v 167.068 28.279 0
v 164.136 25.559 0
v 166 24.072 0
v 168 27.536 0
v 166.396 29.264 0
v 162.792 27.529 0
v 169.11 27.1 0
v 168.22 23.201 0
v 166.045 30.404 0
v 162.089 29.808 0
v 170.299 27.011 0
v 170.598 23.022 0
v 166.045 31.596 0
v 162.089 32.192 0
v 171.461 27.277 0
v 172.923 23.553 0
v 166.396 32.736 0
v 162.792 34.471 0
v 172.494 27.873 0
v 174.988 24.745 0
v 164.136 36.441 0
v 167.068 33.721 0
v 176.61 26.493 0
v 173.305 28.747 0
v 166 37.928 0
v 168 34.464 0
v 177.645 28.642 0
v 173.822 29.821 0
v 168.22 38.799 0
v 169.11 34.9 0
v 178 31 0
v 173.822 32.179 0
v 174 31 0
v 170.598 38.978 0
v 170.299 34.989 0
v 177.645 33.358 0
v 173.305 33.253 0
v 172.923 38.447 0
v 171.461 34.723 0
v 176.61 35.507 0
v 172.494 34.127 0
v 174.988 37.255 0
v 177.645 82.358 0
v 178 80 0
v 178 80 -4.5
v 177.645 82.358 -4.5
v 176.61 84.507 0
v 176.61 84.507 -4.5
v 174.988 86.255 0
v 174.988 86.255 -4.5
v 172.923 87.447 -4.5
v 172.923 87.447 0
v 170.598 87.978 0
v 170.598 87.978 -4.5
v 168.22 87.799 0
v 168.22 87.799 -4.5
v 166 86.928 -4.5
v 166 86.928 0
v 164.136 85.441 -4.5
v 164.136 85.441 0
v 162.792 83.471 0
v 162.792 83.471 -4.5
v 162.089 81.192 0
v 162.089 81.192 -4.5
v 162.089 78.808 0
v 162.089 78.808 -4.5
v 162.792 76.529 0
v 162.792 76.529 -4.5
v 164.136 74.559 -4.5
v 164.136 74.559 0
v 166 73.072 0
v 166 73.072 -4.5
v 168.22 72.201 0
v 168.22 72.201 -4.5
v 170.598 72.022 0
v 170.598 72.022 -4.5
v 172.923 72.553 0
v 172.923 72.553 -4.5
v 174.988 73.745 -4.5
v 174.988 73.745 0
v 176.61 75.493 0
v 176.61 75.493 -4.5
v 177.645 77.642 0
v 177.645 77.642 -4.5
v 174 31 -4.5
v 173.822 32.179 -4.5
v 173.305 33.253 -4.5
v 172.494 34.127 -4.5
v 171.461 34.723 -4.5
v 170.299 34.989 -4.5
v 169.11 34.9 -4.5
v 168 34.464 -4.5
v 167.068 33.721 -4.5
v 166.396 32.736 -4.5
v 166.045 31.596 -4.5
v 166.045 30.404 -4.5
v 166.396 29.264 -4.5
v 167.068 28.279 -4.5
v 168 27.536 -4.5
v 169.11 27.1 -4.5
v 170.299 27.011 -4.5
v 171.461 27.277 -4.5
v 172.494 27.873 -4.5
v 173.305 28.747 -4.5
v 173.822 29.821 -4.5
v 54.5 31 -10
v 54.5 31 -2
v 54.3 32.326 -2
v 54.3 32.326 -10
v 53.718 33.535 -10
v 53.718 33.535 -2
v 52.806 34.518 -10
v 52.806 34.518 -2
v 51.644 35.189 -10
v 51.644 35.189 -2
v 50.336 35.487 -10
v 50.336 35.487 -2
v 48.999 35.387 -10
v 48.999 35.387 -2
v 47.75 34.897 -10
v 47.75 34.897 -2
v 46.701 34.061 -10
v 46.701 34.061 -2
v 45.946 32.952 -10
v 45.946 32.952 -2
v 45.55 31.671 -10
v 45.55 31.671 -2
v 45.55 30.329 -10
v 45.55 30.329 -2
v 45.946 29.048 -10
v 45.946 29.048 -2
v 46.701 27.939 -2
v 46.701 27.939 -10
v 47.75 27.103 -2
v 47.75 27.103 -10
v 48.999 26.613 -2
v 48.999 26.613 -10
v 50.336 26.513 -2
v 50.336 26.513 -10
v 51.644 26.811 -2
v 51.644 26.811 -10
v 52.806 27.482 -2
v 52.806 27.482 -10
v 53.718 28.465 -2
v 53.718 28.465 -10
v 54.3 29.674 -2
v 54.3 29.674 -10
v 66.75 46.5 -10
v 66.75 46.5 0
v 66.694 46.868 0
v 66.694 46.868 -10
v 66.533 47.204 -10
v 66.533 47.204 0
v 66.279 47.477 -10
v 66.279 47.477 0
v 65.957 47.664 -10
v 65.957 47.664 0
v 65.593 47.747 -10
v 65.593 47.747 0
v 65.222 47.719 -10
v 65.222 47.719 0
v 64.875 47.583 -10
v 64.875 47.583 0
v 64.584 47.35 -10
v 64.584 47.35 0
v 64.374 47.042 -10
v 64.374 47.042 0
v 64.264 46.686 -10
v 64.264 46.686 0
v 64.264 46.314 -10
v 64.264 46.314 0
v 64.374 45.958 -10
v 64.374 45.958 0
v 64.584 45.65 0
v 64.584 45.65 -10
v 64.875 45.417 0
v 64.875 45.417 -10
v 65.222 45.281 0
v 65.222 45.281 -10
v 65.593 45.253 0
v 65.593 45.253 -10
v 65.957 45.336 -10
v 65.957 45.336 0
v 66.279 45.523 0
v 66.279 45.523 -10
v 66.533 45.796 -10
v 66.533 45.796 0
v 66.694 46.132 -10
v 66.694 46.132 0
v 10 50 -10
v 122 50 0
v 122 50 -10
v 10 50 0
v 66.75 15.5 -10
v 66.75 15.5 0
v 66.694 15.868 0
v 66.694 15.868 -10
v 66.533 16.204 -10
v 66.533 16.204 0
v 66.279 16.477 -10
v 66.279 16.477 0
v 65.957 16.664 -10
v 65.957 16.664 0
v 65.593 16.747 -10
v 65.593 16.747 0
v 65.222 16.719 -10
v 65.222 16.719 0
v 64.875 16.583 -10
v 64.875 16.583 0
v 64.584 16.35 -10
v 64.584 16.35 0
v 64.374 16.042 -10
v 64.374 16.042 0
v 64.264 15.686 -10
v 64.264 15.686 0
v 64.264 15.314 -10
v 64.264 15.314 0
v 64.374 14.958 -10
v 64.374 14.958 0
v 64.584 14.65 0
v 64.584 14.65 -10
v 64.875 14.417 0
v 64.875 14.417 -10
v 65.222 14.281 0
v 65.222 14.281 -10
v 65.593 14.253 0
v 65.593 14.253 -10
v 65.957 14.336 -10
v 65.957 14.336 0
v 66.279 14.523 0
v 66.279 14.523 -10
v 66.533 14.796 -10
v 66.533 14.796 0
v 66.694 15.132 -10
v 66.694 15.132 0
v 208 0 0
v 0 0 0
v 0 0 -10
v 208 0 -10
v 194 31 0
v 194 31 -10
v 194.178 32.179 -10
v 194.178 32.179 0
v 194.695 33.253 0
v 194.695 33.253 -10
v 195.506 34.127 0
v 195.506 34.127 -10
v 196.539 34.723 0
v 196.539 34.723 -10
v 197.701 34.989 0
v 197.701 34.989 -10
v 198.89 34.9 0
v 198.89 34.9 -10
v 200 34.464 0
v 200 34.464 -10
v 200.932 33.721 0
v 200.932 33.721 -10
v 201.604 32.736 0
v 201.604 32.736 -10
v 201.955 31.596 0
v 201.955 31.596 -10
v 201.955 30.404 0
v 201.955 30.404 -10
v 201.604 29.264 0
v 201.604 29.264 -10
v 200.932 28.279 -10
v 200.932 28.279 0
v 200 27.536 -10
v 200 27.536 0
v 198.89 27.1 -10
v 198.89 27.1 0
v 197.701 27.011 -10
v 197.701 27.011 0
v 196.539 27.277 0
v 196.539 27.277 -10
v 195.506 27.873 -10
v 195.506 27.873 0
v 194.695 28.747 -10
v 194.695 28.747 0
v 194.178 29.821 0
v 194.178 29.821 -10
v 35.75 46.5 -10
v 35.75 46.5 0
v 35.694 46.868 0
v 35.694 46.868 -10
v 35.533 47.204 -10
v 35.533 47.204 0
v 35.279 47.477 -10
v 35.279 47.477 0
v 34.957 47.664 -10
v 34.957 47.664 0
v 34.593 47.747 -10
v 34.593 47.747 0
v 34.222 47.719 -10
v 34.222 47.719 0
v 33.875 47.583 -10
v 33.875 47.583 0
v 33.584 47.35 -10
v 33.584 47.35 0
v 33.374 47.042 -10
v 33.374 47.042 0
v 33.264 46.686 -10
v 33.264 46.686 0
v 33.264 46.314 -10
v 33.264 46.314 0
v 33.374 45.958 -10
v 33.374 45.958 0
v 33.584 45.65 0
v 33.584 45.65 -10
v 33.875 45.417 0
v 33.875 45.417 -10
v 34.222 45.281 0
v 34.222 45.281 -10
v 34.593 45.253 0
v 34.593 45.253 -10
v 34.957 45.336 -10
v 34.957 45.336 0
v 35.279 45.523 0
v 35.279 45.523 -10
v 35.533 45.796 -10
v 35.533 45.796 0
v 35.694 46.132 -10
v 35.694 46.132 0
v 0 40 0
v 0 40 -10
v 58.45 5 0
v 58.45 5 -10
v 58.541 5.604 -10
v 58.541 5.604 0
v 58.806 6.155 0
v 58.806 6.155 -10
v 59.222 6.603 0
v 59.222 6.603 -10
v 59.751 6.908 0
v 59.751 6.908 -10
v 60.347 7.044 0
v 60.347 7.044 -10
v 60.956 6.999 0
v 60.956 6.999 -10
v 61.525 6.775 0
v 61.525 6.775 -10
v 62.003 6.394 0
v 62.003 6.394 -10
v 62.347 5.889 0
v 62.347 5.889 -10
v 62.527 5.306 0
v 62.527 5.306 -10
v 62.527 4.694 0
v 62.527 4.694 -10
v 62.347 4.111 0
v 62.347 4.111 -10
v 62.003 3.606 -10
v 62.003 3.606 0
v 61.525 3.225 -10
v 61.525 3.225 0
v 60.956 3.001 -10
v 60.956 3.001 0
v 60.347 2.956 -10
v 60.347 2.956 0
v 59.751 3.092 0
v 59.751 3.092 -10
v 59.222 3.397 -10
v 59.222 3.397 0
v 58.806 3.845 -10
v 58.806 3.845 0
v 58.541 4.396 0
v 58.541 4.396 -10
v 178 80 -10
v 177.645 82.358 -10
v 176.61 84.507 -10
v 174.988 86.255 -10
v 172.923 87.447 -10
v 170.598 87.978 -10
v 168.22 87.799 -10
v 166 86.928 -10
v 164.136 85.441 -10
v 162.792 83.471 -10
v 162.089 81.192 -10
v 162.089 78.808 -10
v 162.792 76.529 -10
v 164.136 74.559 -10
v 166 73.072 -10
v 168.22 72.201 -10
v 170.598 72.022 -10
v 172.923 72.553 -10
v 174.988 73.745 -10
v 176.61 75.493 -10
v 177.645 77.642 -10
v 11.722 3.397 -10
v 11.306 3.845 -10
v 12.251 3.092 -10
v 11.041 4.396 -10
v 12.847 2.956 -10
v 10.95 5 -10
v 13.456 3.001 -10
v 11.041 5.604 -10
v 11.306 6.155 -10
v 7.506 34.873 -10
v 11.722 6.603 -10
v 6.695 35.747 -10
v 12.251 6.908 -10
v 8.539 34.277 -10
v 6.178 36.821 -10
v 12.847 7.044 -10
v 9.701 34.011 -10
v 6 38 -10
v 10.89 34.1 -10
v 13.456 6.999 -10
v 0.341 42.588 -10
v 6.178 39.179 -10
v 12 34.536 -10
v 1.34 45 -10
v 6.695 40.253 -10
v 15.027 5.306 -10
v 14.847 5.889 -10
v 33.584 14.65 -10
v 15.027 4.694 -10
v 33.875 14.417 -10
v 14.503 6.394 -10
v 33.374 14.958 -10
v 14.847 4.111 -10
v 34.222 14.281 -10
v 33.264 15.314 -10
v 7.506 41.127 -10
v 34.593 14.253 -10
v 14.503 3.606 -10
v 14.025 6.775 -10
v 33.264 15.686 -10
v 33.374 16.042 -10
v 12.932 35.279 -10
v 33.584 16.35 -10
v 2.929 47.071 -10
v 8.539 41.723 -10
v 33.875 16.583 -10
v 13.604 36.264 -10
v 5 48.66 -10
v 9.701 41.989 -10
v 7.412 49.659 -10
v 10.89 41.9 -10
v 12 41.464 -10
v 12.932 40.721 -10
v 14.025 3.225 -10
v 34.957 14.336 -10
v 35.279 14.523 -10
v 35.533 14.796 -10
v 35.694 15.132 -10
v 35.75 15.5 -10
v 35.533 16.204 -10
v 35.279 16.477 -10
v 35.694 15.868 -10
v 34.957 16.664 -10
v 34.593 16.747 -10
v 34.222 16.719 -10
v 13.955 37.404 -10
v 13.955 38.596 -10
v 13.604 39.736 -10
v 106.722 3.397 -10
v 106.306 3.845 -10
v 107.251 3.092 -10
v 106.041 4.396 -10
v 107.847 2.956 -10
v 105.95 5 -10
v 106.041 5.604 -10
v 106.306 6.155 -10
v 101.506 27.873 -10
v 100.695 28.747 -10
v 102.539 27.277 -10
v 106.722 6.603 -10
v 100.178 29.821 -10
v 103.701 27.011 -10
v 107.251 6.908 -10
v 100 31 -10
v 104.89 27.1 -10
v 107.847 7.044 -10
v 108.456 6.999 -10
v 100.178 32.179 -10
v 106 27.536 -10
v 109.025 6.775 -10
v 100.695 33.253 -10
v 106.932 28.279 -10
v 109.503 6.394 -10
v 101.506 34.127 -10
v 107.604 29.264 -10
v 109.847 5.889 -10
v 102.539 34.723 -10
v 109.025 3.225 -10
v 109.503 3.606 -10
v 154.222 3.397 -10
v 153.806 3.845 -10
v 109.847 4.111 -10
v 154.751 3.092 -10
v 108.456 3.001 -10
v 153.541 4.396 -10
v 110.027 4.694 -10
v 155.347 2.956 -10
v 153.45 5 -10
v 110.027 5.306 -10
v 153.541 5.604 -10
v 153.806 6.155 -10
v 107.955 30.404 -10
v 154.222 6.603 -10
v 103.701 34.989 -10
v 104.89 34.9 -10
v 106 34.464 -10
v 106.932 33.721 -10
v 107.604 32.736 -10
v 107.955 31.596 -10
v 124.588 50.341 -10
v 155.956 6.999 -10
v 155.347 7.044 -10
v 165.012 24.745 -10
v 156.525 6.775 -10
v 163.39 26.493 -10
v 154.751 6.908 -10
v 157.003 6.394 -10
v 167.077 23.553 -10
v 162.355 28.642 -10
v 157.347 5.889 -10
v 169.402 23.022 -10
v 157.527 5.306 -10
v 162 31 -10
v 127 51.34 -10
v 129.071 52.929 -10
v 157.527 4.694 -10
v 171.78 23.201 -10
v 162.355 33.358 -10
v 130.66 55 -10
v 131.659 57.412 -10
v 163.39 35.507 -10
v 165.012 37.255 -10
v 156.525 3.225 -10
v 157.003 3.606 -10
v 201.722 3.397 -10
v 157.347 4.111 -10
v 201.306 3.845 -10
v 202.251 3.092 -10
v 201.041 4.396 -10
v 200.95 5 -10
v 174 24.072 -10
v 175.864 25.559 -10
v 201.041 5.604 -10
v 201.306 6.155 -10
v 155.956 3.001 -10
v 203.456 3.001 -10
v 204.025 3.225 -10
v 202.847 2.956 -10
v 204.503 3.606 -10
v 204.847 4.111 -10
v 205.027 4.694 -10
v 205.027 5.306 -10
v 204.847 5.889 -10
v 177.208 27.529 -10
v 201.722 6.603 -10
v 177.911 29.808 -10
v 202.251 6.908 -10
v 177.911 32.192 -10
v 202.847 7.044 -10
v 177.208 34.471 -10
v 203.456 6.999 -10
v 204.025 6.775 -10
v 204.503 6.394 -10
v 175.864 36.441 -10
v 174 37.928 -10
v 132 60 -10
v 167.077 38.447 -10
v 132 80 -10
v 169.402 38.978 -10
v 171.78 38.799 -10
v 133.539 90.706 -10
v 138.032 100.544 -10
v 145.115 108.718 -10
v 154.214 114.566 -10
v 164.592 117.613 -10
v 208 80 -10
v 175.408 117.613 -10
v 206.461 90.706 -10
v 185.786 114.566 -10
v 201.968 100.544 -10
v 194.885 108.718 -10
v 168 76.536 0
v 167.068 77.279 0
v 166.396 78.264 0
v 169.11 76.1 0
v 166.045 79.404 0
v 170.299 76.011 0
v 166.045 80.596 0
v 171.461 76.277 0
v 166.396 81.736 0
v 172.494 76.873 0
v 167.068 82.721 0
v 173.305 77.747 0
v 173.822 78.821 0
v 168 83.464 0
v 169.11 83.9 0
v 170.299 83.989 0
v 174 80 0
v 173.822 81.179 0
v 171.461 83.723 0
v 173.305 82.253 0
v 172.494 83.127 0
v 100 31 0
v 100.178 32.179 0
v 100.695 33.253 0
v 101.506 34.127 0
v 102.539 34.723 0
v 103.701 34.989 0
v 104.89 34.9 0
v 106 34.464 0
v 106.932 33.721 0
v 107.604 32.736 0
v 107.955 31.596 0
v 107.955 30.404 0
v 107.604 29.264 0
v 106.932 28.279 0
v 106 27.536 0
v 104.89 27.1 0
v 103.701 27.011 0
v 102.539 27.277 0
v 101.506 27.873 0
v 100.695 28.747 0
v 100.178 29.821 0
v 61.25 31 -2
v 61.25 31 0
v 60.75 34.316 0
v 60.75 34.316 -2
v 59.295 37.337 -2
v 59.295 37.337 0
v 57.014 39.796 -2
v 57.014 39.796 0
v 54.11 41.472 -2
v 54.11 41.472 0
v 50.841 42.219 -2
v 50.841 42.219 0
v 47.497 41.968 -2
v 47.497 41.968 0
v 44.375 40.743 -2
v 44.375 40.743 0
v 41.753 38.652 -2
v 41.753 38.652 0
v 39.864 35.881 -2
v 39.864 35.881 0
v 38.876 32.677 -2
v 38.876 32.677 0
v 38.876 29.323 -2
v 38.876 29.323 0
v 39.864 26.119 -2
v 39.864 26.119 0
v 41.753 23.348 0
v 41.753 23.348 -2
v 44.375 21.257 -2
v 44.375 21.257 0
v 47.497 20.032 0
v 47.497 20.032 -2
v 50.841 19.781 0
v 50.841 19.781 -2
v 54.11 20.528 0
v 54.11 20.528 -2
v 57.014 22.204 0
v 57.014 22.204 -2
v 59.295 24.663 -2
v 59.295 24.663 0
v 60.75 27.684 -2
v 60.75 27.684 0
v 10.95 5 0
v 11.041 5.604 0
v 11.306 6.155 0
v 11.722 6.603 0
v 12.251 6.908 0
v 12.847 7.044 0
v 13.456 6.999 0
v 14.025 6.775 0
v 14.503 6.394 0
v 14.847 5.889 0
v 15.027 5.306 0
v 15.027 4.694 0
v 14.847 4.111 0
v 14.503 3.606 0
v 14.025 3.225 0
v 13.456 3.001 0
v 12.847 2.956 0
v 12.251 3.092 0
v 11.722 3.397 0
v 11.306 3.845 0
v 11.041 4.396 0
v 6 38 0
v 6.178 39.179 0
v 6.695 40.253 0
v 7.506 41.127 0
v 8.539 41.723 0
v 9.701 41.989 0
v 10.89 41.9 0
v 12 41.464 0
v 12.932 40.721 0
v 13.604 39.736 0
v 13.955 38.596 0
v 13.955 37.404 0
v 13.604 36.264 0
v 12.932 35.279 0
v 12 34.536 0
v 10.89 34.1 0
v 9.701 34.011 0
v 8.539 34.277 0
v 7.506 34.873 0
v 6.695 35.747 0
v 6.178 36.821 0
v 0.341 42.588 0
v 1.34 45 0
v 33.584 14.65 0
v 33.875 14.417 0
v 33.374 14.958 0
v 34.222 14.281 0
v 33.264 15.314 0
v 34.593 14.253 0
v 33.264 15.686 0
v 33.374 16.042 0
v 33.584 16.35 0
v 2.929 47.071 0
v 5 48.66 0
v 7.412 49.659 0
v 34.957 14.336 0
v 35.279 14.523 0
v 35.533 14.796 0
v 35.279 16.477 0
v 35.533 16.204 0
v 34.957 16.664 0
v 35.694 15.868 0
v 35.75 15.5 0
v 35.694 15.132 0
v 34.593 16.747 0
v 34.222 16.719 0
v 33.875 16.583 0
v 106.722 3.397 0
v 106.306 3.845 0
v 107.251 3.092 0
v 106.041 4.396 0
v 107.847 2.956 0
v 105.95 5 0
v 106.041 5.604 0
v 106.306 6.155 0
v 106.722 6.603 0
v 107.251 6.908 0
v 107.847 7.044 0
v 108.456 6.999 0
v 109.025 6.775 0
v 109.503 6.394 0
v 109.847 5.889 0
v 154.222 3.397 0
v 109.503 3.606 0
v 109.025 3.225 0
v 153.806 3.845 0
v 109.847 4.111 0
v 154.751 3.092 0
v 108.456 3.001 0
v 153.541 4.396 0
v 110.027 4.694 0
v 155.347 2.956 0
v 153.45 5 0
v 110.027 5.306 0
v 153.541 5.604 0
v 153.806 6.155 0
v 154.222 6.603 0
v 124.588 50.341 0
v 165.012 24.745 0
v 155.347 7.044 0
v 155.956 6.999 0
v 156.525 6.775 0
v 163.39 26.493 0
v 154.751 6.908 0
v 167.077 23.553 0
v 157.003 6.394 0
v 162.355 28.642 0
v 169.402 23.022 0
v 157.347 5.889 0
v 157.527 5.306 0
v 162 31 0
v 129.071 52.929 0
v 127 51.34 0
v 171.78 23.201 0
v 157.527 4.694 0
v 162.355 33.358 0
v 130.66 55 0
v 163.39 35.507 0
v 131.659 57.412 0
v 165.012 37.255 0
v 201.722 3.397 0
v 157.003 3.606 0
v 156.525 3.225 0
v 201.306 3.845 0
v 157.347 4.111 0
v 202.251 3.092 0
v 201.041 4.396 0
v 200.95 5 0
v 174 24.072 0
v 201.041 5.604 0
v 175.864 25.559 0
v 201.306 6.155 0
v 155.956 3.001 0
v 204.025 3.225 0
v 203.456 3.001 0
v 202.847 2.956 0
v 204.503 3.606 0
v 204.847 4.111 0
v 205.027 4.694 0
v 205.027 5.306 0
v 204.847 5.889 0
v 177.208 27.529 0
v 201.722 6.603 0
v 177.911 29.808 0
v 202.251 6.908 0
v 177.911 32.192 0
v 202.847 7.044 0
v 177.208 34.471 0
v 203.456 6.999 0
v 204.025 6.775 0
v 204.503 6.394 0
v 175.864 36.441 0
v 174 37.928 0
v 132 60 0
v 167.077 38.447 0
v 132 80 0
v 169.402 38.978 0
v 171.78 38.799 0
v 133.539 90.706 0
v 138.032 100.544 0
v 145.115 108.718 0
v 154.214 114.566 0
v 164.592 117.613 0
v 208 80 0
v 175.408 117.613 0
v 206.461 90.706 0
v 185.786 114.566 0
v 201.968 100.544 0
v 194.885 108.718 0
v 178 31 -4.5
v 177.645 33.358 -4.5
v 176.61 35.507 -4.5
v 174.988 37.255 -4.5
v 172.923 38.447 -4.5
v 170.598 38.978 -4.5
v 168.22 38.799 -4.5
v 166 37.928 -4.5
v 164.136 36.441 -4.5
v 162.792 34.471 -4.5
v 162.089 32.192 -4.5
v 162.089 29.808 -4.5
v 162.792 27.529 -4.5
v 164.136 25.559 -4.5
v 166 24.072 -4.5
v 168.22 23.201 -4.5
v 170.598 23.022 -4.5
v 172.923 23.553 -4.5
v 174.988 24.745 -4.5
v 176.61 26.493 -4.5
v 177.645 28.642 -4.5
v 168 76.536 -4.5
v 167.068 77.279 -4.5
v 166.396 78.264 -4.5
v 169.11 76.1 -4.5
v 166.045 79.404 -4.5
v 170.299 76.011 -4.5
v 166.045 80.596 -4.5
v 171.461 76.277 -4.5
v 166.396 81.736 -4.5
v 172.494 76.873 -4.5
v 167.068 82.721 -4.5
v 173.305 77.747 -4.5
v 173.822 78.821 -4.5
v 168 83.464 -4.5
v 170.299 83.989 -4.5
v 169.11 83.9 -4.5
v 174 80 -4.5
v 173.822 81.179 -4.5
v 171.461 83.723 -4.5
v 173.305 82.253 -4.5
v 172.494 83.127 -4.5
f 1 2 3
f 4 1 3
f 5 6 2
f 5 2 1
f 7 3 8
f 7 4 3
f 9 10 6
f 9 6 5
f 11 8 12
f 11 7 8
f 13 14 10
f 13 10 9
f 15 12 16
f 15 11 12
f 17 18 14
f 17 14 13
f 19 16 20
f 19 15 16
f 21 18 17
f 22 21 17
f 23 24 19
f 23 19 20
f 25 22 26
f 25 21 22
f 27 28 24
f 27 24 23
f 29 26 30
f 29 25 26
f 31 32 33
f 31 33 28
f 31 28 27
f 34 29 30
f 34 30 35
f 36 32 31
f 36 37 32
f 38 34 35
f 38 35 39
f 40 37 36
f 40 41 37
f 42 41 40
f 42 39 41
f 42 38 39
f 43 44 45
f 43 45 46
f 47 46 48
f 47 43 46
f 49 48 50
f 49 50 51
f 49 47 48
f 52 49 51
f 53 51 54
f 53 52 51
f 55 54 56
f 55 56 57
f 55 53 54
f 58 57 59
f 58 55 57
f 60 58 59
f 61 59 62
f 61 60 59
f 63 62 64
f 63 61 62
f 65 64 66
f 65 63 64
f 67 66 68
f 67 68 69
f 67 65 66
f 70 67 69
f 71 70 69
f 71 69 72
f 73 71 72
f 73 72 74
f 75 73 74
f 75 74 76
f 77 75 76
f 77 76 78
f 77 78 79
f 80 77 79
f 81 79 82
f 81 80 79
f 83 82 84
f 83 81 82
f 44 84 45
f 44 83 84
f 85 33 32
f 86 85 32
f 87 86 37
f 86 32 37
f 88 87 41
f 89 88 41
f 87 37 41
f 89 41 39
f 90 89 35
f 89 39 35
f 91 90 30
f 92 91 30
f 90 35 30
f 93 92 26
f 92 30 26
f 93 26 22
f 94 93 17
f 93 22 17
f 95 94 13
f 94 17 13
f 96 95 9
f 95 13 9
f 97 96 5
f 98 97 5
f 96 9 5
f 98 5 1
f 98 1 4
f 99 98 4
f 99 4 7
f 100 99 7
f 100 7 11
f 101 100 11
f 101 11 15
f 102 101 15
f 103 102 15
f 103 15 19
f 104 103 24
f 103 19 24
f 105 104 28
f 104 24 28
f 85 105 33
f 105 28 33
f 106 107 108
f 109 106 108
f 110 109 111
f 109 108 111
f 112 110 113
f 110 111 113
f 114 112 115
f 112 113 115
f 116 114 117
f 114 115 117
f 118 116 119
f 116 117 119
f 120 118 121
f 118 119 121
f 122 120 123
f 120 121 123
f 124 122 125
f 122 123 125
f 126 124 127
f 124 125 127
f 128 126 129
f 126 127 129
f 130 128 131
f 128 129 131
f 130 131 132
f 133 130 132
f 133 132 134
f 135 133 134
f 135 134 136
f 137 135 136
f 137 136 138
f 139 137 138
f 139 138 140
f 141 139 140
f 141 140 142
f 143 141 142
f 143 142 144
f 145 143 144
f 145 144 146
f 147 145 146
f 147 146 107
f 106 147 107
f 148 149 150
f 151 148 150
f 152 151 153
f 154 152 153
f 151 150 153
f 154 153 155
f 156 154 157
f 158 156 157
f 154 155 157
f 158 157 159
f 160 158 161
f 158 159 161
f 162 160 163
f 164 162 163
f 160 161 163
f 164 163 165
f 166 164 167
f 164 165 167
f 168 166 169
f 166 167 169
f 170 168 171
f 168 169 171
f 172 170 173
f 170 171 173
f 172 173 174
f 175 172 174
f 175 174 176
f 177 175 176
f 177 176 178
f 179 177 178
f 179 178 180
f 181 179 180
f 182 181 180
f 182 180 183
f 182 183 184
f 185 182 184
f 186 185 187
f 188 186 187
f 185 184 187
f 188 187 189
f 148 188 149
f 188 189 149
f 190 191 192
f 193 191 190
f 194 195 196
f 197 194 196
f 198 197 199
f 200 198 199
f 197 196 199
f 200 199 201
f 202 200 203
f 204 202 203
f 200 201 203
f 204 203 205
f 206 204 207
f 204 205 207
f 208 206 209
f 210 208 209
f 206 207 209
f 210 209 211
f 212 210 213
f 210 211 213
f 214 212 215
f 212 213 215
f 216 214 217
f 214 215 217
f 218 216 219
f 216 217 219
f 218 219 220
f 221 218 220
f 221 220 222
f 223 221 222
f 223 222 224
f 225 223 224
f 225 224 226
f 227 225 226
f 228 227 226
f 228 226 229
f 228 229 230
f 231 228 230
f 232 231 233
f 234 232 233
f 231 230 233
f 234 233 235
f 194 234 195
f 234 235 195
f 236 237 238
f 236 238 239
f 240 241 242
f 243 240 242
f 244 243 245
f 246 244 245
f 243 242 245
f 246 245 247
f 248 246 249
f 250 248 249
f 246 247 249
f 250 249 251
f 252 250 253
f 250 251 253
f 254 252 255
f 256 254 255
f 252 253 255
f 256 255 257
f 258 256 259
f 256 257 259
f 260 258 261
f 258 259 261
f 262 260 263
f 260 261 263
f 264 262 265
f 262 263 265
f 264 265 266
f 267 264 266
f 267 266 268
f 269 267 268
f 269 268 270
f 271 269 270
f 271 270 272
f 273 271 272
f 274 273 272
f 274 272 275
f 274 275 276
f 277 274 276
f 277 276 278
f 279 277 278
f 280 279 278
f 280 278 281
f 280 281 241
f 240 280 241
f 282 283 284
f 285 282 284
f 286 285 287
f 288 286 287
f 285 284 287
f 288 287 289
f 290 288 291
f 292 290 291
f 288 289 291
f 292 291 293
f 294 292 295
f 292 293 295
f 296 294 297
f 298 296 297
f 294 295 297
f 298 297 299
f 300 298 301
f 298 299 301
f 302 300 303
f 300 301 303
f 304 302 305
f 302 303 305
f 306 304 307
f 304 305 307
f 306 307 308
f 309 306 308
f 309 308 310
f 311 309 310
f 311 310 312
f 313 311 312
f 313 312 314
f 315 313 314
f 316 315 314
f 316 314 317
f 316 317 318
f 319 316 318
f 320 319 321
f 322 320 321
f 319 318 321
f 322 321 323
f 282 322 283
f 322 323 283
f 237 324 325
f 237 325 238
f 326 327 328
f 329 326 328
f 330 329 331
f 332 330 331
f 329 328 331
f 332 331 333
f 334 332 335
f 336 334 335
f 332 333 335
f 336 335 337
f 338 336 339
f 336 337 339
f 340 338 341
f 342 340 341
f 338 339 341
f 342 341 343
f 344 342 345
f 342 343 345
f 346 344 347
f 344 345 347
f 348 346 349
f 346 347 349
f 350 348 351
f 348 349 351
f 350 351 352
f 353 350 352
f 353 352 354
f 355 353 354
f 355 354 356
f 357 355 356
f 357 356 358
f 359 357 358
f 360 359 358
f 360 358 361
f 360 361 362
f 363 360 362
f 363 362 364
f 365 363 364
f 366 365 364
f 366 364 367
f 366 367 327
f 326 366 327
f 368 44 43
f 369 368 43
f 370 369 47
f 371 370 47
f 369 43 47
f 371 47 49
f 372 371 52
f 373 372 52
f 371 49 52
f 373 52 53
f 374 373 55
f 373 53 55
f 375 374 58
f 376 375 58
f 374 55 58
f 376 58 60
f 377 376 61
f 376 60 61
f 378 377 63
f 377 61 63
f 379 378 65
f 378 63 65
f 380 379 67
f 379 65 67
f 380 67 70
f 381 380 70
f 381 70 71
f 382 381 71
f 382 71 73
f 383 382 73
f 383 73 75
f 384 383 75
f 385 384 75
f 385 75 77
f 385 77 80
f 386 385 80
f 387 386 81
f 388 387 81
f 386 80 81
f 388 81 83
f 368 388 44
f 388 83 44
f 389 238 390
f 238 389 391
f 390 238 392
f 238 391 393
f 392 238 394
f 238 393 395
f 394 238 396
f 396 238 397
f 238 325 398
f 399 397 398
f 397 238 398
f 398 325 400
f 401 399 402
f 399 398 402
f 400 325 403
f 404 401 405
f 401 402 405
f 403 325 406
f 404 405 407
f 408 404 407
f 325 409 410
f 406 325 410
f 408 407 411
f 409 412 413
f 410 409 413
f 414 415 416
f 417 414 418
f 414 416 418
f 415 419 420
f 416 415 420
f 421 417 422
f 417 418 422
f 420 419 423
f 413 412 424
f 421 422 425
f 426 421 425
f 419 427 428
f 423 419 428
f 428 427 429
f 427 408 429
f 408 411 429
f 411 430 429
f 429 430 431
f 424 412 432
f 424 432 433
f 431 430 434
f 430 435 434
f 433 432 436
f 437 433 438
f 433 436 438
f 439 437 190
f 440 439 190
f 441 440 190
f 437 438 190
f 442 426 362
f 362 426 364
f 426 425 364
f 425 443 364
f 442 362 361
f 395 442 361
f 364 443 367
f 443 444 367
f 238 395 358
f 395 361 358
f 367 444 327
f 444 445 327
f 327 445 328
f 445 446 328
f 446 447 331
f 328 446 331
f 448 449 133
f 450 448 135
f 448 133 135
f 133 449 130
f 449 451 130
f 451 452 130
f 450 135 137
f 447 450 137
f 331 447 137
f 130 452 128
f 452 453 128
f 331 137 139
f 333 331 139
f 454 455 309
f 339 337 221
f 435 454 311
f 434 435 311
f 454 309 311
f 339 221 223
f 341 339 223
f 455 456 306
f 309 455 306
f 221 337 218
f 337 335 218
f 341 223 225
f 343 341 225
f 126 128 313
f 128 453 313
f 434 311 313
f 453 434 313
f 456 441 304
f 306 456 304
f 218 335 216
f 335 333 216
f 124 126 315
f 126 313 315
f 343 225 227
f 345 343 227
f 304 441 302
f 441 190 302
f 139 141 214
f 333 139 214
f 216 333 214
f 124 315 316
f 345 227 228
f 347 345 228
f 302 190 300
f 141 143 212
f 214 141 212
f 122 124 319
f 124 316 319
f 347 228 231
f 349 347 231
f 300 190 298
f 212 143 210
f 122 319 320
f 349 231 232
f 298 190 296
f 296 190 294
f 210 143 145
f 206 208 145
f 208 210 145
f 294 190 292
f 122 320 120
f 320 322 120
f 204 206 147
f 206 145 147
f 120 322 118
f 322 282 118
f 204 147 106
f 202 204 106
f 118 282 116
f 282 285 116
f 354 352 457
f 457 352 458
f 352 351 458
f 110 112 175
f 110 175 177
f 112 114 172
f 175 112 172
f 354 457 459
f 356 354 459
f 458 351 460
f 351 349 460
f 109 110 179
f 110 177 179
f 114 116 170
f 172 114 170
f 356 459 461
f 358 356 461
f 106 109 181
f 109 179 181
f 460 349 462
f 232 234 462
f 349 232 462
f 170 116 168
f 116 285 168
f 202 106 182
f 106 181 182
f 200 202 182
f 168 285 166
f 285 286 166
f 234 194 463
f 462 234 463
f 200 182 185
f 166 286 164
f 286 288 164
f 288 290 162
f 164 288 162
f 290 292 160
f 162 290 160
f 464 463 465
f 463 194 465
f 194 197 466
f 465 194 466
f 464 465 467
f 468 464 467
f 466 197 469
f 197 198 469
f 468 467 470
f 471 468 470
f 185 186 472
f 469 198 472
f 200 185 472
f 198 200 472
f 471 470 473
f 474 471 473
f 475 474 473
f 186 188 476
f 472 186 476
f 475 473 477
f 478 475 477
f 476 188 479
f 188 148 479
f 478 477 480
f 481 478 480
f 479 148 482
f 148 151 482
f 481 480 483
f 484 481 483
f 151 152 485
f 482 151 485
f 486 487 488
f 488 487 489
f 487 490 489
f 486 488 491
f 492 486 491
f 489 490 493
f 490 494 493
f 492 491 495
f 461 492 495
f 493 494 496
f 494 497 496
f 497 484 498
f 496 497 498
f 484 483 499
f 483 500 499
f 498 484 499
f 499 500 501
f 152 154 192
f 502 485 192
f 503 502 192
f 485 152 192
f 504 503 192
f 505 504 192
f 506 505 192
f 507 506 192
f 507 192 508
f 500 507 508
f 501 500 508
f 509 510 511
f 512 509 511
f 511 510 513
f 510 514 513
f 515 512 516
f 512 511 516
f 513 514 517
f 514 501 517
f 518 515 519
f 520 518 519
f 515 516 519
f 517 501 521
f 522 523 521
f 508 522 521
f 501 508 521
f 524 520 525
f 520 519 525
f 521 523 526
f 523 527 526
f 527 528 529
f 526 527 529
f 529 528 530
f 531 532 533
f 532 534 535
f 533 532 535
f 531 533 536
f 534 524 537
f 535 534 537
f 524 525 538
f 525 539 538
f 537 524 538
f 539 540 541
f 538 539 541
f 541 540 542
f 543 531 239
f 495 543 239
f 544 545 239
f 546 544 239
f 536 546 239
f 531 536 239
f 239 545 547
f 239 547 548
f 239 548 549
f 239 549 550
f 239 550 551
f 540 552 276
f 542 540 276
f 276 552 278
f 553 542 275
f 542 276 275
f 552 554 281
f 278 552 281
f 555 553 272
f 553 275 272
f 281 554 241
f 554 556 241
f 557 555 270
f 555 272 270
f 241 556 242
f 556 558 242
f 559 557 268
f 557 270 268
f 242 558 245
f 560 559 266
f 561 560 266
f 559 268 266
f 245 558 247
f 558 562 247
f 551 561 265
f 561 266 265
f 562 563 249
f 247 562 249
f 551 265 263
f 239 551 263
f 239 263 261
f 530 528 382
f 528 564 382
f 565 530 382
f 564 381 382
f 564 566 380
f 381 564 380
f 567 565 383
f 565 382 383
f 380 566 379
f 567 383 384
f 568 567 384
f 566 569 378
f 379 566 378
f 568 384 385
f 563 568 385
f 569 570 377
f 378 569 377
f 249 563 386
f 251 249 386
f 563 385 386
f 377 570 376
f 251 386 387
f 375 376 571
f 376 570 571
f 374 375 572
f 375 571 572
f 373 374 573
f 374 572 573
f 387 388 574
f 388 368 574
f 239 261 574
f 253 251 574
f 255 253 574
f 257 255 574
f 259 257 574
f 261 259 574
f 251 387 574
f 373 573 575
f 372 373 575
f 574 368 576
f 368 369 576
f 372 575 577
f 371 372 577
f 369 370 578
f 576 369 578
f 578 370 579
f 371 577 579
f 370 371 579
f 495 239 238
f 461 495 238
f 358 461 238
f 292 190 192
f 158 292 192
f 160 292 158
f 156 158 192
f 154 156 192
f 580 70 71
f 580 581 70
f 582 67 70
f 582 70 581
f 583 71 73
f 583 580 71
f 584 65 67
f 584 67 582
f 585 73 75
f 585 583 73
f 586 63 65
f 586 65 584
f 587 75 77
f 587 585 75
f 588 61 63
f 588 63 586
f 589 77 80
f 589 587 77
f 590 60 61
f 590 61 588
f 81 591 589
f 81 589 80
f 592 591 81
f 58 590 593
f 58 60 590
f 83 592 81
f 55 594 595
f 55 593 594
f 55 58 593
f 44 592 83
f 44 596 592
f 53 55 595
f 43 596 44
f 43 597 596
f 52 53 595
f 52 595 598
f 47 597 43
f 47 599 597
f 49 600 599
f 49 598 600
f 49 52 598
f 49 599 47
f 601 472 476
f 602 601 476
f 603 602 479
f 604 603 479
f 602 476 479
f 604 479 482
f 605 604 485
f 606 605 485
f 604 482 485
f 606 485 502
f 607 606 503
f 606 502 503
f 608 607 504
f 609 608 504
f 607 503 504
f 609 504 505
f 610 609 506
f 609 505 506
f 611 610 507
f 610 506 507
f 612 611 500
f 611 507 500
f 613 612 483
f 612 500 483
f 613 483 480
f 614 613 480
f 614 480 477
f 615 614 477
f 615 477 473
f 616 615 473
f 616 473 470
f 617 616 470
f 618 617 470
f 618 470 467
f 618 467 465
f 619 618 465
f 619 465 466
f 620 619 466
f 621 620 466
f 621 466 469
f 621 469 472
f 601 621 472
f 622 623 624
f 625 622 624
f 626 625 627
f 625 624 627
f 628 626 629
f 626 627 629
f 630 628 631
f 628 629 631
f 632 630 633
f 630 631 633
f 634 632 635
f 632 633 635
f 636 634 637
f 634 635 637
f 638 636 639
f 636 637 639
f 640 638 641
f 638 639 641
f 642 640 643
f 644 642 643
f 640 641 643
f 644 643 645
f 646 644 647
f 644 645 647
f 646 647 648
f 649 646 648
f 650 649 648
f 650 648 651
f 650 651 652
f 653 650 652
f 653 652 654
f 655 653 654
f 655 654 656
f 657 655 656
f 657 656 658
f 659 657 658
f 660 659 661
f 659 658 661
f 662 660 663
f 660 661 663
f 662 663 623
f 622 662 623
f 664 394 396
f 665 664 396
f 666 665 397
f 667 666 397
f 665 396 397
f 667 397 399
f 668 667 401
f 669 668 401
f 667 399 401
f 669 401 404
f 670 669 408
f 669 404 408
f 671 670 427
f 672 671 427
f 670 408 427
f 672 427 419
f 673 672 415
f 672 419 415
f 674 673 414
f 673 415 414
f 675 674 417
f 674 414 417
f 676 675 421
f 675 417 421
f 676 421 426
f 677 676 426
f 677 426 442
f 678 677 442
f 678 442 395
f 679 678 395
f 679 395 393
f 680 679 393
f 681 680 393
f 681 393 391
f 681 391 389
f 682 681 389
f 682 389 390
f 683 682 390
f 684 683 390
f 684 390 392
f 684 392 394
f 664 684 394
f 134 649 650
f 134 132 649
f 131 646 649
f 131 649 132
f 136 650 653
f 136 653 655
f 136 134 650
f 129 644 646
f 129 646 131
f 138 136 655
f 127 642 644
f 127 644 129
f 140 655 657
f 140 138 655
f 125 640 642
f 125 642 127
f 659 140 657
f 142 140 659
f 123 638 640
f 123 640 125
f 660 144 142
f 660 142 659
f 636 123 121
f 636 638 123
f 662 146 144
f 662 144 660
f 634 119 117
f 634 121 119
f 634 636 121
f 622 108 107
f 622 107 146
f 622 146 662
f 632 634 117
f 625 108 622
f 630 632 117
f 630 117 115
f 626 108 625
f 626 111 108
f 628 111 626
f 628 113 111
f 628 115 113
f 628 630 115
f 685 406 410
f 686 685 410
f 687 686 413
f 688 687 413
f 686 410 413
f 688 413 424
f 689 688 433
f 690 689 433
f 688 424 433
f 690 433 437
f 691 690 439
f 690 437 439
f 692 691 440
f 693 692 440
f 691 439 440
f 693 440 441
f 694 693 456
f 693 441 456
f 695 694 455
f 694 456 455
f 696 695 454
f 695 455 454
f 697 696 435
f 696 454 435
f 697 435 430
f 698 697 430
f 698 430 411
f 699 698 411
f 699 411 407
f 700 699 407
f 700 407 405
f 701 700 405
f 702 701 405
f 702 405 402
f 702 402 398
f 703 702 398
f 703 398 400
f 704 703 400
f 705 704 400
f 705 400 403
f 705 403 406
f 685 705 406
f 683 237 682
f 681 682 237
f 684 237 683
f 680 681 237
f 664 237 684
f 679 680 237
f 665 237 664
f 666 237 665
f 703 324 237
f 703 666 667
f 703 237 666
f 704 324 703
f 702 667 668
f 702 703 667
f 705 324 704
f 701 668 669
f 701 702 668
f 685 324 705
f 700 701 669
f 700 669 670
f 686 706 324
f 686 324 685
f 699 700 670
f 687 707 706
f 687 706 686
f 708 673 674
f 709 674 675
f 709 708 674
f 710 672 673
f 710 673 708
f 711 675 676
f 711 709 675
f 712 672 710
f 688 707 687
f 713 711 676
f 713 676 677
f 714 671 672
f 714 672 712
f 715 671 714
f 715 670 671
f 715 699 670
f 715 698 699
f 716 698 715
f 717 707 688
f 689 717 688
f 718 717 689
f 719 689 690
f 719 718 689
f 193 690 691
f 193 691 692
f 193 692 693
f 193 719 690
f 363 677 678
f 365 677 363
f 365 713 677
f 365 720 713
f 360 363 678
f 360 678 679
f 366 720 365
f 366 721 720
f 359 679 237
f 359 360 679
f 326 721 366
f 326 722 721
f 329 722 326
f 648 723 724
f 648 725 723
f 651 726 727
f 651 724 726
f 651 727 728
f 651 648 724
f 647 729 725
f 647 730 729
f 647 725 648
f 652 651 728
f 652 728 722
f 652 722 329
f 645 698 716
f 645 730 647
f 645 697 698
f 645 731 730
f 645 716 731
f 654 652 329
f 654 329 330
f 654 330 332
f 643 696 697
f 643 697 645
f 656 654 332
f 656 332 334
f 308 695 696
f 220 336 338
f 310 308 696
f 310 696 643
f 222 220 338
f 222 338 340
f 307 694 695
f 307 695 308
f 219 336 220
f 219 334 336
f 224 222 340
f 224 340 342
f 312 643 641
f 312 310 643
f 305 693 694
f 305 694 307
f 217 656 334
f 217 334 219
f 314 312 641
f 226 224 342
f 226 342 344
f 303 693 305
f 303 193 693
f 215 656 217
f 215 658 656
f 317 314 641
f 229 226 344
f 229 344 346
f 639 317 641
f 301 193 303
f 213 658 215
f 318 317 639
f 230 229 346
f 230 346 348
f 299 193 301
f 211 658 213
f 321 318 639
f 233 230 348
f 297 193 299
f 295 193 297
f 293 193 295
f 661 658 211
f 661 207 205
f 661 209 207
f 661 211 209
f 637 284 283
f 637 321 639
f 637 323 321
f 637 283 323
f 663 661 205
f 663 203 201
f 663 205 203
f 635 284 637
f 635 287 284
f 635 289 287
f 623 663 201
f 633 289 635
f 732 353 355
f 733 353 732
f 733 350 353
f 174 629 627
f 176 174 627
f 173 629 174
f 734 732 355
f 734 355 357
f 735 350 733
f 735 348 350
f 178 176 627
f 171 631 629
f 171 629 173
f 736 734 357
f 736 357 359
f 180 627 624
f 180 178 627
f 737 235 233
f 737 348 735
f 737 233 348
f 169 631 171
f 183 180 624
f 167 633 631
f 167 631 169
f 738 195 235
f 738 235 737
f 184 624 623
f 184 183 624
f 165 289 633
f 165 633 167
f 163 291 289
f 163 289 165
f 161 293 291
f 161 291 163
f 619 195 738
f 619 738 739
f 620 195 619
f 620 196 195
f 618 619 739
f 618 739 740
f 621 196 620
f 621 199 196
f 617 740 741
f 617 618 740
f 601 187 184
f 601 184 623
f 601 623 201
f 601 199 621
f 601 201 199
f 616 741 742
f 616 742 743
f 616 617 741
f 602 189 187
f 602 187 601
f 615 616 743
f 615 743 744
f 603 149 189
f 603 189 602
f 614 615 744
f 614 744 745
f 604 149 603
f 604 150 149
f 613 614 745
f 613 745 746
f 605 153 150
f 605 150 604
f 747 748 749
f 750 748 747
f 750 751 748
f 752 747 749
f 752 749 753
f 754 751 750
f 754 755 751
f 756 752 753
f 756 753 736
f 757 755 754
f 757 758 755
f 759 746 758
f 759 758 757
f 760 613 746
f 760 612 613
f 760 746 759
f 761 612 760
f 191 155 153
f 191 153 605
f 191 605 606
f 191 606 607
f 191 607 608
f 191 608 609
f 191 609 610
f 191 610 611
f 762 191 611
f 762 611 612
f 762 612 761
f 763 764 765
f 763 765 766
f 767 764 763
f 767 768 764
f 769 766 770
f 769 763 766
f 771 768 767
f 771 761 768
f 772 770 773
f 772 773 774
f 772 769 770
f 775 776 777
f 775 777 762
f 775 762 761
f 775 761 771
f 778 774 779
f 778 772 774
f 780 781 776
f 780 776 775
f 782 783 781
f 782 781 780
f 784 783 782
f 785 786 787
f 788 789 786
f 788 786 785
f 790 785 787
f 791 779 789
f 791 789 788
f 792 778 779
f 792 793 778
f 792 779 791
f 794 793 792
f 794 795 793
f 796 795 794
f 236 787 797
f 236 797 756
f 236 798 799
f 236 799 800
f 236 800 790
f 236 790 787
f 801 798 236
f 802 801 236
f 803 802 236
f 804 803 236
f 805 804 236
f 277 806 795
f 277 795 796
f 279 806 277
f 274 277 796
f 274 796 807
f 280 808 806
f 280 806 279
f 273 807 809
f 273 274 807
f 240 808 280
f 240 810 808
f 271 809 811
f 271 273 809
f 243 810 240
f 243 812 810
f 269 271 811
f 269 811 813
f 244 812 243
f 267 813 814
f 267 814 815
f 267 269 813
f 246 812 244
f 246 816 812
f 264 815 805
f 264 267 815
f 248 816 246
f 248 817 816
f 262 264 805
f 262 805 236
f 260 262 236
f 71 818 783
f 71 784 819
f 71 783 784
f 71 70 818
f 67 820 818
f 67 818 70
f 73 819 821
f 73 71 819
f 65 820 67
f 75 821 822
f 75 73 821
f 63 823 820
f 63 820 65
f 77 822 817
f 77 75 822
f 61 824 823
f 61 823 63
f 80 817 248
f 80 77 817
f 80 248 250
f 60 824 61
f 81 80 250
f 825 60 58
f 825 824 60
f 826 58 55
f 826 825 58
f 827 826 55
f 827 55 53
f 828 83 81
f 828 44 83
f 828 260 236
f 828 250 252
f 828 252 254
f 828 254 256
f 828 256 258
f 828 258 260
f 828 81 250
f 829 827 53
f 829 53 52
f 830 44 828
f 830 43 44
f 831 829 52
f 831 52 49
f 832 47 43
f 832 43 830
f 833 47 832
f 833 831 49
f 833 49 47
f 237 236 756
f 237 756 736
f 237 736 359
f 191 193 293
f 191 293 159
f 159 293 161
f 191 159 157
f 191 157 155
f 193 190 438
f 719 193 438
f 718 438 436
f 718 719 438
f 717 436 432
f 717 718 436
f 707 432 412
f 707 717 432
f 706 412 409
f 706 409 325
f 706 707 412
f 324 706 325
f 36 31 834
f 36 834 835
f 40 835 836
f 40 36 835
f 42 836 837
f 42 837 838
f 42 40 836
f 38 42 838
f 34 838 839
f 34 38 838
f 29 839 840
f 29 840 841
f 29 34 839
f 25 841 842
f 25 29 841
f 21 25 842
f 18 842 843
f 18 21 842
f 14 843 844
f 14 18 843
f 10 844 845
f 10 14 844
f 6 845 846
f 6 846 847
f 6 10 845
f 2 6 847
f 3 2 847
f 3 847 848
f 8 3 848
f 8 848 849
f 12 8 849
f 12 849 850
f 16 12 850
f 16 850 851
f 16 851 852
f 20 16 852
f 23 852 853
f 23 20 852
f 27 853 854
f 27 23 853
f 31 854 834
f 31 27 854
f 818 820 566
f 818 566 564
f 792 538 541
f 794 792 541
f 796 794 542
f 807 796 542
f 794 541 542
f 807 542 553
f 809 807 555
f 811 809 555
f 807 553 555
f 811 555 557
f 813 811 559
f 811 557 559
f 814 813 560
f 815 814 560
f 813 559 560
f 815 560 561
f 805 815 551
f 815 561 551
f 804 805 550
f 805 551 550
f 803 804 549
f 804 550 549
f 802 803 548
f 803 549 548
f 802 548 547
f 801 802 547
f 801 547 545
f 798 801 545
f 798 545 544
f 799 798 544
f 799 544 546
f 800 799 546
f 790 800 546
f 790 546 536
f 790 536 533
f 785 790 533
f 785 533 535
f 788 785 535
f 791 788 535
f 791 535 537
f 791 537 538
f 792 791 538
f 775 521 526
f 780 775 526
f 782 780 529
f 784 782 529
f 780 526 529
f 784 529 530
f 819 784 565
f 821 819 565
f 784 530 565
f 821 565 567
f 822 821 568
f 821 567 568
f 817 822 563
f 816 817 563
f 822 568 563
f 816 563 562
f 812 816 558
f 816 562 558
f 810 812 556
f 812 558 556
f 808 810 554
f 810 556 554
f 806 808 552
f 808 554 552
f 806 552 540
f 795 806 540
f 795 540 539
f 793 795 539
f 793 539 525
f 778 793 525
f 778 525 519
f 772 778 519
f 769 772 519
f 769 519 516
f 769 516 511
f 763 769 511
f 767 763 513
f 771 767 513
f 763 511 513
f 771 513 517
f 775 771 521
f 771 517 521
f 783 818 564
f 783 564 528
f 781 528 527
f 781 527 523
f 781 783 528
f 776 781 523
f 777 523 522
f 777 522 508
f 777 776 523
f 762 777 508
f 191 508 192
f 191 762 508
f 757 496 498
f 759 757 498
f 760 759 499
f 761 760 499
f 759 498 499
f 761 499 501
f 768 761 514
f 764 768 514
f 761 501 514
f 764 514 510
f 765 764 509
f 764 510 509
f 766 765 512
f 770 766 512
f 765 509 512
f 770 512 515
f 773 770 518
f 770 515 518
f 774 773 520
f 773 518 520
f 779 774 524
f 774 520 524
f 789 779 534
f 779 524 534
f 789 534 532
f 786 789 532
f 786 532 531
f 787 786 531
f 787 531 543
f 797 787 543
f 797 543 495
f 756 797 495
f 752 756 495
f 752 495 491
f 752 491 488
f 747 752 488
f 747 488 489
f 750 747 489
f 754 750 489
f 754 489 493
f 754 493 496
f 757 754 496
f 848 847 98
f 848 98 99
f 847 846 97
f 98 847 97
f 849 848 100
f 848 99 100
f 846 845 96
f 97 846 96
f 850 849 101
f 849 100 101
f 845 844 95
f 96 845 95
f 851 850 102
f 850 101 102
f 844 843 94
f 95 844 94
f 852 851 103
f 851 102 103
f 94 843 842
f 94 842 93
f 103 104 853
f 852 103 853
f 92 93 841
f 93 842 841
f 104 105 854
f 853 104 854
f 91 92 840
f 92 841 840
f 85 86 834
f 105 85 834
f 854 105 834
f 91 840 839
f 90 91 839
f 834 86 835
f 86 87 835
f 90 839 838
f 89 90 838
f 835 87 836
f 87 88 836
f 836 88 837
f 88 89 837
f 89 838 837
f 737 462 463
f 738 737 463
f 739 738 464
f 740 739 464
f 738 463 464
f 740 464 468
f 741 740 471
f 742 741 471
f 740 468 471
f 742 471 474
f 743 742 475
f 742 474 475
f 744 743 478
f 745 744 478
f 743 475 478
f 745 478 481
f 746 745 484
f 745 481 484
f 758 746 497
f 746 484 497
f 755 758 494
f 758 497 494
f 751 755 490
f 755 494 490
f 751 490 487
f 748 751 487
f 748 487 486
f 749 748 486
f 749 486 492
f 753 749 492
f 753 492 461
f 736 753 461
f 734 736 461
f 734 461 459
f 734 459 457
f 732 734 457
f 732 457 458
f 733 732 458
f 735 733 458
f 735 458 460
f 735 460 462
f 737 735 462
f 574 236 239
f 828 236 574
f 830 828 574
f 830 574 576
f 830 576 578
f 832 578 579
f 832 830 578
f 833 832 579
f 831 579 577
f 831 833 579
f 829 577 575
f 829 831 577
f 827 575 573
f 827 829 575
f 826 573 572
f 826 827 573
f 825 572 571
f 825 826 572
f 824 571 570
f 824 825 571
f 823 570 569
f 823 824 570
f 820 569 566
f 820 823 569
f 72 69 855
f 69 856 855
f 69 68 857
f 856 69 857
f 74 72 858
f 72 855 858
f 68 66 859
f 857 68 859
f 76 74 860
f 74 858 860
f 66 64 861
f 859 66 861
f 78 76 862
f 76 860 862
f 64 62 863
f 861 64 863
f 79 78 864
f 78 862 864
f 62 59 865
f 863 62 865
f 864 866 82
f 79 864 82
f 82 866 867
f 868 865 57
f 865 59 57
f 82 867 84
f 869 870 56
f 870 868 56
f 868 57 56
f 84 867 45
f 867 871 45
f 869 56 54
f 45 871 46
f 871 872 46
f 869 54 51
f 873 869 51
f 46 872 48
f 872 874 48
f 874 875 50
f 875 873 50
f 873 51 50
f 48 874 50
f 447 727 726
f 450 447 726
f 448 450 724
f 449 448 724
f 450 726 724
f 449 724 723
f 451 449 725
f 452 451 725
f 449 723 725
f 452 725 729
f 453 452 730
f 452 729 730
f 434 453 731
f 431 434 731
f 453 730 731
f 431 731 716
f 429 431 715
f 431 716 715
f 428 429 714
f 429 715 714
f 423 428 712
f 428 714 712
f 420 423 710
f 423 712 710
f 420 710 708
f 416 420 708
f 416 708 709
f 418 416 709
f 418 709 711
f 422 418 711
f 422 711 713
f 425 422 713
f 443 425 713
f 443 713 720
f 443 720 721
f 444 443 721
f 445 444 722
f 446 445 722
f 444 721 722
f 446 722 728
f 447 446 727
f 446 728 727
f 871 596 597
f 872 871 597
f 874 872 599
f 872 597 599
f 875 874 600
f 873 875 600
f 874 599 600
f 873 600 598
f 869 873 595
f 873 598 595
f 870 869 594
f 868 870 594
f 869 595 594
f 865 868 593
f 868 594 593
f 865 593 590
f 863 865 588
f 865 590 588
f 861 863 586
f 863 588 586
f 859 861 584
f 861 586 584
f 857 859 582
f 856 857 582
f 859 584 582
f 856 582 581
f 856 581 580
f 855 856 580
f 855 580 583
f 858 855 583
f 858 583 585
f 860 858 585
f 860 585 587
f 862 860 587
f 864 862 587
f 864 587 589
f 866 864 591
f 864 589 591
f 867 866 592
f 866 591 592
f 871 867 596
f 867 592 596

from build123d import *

# Parameters (mm, degrees)
CROQUIS1_R                = 8
CROQUIS1_R_2              = 4.5
CROQUIS1_R_3              = 1.25
SALIENTE_EXTRUIR1_DEPTH   = 10
CROQUIS2_R                = 11.25
CORTAR_EXTRUIR1_DEPTH     = 2
CROQUIS3_R                = 8
CORTAR_EXTRUIR2_DEPTH     = 10
CROQUIS4_R                = 2.05
CORTAR_EXTRUIR3_DEPTH     = 240.3491174
CROQUIS6_R                = 8
CROQUIS6_R_2              = 4
SALIENTE_EXTRUIR2_DEPTH   = 4.5
SALIENTE_EXTRUIR2_2_DEPTH = 4.5
CROQUIS7_R                = 4
CORTAR_EXTRUIR4_DEPTH     = 240.3491174


with BuildPart() as part:
    # Croquis1 → Saliente-Extruir1 (new body)
    with BuildSketch(Plane.XY):
        with BuildLine():
            Line((0, 0), (208, 0))
            Line((208, 0), (208, 80))
            ThreePointArc((208, 80), (170, 118), (132, 80))
            Line((132, 80), (132, 60))
            ThreePointArc((132, 60), (129.071067812, 52.928932188), (122, 50))
            Line((122, 50), (10, 50))
            ThreePointArc((10, 50), (2.928932188, 47.071067812), (0, 40))
            Line((0, 40), (0, 0))
        make_face()
        with Locations((170, 80)):
            Circle(CROQUIS1_R, mode=Mode.SUBTRACT)
        with Locations((50, 31)):
            Circle(CROQUIS1_R_2, mode=Mode.SUBTRACT)
        with Locations((65.5, 46.5)):
            Circle(CROQUIS1_R_3, mode=Mode.SUBTRACT)
        with Locations((34.5, 46.5)):
            Circle(CROQUIS1_R_3, mode=Mode.SUBTRACT)
        with Locations((34.5, 15.5)):
            Circle(CROQUIS1_R_3, mode=Mode.SUBTRACT)
        with Locations((65.5, 15.5)):
            Circle(CROQUIS1_R_3, mode=Mode.SUBTRACT)
    extrude(amount=-SALIENTE_EXTRUIR1_DEPTH)

    # Croquis2 → Cortar-Extruir1 (cut)
    with BuildSketch(Plane.XY):
        with Locations((50, 31)):
            Circle(CROQUIS2_R)
    extrude(amount=-CORTAR_EXTRUIR1_DEPTH, mode=Mode.SUBTRACT)

    # Croquis3 → Cortar-Extruir2 (cut)
    with BuildSketch(Plane(origin=(0, 0, -10), x_dir=(-1, 0, 0), z_dir=(0, 0, -1))):
        with Locations((-170, 31)):
            Circle(CROQUIS3_R)
    extrude(amount=-CORTAR_EXTRUIR2_DEPTH, mode=Mode.SUBTRACT)

    # Croquis4 → Cortar-Extruir3 (cut, through all)
    with BuildSketch(Plane(origin=(0, 0, -10), x_dir=(-1, 0, 0), z_dir=(0, 0, -1))):
        with Locations((-203, 5)):
            Circle(CROQUIS4_R)
        with Locations((-155.5, 5)):
            Circle(CROQUIS4_R)
        with Locations((-108, 5)):
            Circle(CROQUIS4_R)
        with Locations((-60.5, 5)):
            Circle(CROQUIS4_R)
        with Locations((-13, 5)):
            Circle(CROQUIS4_R)
    extrude(amount=-CORTAR_EXTRUIR3_DEPTH, mode=Mode.SUBTRACT)

    # Croquis7 → Cortar-Extruir4 (cut, through all)
    with BuildSketch(Plane(origin=(0, 0, -10), x_dir=(-1, 0, 0), z_dir=(0, 0, -1))):
        with Locations((-198, 31)):
            Circle(CROQUIS7_R)
        with Locations((-104, 31)):
            Circle(CROQUIS7_R)
        with Locations((-10, 38)):
            Circle(CROQUIS7_R)
    extrude(amount=-CORTAR_EXTRUIR4_DEPTH, mode=Mode.SUBTRACT)


with BuildPart() as body_2:
    # Croquis6 → Saliente-Extruir2 (new body)
    with BuildSketch(Plane.XY):
        with Locations((170, 31)):
            Circle(CROQUIS6_R)
        with Locations((170, 31)):
            Circle(CROQUIS6_R_2, mode=Mode.SUBTRACT)
    extrude(amount=-SALIENTE_EXTRUIR2_DEPTH)


with BuildPart() as body_3:
    # Croquis6 → Saliente-Extruir2 2 (new body)
    with BuildSketch(Plane.XY):
        with Locations((170, 80)):
            Circle(CROQUIS6_R)
        with Locations((170, 80)):
            Circle(CROQUIS6_R_2, mode=Mode.SUBTRACT)
    extrude(amount=-SALIENTE_EXTRUIR2_2_DEPTH)


solid = Compound([part.part, body_2.part, body_3.part])
